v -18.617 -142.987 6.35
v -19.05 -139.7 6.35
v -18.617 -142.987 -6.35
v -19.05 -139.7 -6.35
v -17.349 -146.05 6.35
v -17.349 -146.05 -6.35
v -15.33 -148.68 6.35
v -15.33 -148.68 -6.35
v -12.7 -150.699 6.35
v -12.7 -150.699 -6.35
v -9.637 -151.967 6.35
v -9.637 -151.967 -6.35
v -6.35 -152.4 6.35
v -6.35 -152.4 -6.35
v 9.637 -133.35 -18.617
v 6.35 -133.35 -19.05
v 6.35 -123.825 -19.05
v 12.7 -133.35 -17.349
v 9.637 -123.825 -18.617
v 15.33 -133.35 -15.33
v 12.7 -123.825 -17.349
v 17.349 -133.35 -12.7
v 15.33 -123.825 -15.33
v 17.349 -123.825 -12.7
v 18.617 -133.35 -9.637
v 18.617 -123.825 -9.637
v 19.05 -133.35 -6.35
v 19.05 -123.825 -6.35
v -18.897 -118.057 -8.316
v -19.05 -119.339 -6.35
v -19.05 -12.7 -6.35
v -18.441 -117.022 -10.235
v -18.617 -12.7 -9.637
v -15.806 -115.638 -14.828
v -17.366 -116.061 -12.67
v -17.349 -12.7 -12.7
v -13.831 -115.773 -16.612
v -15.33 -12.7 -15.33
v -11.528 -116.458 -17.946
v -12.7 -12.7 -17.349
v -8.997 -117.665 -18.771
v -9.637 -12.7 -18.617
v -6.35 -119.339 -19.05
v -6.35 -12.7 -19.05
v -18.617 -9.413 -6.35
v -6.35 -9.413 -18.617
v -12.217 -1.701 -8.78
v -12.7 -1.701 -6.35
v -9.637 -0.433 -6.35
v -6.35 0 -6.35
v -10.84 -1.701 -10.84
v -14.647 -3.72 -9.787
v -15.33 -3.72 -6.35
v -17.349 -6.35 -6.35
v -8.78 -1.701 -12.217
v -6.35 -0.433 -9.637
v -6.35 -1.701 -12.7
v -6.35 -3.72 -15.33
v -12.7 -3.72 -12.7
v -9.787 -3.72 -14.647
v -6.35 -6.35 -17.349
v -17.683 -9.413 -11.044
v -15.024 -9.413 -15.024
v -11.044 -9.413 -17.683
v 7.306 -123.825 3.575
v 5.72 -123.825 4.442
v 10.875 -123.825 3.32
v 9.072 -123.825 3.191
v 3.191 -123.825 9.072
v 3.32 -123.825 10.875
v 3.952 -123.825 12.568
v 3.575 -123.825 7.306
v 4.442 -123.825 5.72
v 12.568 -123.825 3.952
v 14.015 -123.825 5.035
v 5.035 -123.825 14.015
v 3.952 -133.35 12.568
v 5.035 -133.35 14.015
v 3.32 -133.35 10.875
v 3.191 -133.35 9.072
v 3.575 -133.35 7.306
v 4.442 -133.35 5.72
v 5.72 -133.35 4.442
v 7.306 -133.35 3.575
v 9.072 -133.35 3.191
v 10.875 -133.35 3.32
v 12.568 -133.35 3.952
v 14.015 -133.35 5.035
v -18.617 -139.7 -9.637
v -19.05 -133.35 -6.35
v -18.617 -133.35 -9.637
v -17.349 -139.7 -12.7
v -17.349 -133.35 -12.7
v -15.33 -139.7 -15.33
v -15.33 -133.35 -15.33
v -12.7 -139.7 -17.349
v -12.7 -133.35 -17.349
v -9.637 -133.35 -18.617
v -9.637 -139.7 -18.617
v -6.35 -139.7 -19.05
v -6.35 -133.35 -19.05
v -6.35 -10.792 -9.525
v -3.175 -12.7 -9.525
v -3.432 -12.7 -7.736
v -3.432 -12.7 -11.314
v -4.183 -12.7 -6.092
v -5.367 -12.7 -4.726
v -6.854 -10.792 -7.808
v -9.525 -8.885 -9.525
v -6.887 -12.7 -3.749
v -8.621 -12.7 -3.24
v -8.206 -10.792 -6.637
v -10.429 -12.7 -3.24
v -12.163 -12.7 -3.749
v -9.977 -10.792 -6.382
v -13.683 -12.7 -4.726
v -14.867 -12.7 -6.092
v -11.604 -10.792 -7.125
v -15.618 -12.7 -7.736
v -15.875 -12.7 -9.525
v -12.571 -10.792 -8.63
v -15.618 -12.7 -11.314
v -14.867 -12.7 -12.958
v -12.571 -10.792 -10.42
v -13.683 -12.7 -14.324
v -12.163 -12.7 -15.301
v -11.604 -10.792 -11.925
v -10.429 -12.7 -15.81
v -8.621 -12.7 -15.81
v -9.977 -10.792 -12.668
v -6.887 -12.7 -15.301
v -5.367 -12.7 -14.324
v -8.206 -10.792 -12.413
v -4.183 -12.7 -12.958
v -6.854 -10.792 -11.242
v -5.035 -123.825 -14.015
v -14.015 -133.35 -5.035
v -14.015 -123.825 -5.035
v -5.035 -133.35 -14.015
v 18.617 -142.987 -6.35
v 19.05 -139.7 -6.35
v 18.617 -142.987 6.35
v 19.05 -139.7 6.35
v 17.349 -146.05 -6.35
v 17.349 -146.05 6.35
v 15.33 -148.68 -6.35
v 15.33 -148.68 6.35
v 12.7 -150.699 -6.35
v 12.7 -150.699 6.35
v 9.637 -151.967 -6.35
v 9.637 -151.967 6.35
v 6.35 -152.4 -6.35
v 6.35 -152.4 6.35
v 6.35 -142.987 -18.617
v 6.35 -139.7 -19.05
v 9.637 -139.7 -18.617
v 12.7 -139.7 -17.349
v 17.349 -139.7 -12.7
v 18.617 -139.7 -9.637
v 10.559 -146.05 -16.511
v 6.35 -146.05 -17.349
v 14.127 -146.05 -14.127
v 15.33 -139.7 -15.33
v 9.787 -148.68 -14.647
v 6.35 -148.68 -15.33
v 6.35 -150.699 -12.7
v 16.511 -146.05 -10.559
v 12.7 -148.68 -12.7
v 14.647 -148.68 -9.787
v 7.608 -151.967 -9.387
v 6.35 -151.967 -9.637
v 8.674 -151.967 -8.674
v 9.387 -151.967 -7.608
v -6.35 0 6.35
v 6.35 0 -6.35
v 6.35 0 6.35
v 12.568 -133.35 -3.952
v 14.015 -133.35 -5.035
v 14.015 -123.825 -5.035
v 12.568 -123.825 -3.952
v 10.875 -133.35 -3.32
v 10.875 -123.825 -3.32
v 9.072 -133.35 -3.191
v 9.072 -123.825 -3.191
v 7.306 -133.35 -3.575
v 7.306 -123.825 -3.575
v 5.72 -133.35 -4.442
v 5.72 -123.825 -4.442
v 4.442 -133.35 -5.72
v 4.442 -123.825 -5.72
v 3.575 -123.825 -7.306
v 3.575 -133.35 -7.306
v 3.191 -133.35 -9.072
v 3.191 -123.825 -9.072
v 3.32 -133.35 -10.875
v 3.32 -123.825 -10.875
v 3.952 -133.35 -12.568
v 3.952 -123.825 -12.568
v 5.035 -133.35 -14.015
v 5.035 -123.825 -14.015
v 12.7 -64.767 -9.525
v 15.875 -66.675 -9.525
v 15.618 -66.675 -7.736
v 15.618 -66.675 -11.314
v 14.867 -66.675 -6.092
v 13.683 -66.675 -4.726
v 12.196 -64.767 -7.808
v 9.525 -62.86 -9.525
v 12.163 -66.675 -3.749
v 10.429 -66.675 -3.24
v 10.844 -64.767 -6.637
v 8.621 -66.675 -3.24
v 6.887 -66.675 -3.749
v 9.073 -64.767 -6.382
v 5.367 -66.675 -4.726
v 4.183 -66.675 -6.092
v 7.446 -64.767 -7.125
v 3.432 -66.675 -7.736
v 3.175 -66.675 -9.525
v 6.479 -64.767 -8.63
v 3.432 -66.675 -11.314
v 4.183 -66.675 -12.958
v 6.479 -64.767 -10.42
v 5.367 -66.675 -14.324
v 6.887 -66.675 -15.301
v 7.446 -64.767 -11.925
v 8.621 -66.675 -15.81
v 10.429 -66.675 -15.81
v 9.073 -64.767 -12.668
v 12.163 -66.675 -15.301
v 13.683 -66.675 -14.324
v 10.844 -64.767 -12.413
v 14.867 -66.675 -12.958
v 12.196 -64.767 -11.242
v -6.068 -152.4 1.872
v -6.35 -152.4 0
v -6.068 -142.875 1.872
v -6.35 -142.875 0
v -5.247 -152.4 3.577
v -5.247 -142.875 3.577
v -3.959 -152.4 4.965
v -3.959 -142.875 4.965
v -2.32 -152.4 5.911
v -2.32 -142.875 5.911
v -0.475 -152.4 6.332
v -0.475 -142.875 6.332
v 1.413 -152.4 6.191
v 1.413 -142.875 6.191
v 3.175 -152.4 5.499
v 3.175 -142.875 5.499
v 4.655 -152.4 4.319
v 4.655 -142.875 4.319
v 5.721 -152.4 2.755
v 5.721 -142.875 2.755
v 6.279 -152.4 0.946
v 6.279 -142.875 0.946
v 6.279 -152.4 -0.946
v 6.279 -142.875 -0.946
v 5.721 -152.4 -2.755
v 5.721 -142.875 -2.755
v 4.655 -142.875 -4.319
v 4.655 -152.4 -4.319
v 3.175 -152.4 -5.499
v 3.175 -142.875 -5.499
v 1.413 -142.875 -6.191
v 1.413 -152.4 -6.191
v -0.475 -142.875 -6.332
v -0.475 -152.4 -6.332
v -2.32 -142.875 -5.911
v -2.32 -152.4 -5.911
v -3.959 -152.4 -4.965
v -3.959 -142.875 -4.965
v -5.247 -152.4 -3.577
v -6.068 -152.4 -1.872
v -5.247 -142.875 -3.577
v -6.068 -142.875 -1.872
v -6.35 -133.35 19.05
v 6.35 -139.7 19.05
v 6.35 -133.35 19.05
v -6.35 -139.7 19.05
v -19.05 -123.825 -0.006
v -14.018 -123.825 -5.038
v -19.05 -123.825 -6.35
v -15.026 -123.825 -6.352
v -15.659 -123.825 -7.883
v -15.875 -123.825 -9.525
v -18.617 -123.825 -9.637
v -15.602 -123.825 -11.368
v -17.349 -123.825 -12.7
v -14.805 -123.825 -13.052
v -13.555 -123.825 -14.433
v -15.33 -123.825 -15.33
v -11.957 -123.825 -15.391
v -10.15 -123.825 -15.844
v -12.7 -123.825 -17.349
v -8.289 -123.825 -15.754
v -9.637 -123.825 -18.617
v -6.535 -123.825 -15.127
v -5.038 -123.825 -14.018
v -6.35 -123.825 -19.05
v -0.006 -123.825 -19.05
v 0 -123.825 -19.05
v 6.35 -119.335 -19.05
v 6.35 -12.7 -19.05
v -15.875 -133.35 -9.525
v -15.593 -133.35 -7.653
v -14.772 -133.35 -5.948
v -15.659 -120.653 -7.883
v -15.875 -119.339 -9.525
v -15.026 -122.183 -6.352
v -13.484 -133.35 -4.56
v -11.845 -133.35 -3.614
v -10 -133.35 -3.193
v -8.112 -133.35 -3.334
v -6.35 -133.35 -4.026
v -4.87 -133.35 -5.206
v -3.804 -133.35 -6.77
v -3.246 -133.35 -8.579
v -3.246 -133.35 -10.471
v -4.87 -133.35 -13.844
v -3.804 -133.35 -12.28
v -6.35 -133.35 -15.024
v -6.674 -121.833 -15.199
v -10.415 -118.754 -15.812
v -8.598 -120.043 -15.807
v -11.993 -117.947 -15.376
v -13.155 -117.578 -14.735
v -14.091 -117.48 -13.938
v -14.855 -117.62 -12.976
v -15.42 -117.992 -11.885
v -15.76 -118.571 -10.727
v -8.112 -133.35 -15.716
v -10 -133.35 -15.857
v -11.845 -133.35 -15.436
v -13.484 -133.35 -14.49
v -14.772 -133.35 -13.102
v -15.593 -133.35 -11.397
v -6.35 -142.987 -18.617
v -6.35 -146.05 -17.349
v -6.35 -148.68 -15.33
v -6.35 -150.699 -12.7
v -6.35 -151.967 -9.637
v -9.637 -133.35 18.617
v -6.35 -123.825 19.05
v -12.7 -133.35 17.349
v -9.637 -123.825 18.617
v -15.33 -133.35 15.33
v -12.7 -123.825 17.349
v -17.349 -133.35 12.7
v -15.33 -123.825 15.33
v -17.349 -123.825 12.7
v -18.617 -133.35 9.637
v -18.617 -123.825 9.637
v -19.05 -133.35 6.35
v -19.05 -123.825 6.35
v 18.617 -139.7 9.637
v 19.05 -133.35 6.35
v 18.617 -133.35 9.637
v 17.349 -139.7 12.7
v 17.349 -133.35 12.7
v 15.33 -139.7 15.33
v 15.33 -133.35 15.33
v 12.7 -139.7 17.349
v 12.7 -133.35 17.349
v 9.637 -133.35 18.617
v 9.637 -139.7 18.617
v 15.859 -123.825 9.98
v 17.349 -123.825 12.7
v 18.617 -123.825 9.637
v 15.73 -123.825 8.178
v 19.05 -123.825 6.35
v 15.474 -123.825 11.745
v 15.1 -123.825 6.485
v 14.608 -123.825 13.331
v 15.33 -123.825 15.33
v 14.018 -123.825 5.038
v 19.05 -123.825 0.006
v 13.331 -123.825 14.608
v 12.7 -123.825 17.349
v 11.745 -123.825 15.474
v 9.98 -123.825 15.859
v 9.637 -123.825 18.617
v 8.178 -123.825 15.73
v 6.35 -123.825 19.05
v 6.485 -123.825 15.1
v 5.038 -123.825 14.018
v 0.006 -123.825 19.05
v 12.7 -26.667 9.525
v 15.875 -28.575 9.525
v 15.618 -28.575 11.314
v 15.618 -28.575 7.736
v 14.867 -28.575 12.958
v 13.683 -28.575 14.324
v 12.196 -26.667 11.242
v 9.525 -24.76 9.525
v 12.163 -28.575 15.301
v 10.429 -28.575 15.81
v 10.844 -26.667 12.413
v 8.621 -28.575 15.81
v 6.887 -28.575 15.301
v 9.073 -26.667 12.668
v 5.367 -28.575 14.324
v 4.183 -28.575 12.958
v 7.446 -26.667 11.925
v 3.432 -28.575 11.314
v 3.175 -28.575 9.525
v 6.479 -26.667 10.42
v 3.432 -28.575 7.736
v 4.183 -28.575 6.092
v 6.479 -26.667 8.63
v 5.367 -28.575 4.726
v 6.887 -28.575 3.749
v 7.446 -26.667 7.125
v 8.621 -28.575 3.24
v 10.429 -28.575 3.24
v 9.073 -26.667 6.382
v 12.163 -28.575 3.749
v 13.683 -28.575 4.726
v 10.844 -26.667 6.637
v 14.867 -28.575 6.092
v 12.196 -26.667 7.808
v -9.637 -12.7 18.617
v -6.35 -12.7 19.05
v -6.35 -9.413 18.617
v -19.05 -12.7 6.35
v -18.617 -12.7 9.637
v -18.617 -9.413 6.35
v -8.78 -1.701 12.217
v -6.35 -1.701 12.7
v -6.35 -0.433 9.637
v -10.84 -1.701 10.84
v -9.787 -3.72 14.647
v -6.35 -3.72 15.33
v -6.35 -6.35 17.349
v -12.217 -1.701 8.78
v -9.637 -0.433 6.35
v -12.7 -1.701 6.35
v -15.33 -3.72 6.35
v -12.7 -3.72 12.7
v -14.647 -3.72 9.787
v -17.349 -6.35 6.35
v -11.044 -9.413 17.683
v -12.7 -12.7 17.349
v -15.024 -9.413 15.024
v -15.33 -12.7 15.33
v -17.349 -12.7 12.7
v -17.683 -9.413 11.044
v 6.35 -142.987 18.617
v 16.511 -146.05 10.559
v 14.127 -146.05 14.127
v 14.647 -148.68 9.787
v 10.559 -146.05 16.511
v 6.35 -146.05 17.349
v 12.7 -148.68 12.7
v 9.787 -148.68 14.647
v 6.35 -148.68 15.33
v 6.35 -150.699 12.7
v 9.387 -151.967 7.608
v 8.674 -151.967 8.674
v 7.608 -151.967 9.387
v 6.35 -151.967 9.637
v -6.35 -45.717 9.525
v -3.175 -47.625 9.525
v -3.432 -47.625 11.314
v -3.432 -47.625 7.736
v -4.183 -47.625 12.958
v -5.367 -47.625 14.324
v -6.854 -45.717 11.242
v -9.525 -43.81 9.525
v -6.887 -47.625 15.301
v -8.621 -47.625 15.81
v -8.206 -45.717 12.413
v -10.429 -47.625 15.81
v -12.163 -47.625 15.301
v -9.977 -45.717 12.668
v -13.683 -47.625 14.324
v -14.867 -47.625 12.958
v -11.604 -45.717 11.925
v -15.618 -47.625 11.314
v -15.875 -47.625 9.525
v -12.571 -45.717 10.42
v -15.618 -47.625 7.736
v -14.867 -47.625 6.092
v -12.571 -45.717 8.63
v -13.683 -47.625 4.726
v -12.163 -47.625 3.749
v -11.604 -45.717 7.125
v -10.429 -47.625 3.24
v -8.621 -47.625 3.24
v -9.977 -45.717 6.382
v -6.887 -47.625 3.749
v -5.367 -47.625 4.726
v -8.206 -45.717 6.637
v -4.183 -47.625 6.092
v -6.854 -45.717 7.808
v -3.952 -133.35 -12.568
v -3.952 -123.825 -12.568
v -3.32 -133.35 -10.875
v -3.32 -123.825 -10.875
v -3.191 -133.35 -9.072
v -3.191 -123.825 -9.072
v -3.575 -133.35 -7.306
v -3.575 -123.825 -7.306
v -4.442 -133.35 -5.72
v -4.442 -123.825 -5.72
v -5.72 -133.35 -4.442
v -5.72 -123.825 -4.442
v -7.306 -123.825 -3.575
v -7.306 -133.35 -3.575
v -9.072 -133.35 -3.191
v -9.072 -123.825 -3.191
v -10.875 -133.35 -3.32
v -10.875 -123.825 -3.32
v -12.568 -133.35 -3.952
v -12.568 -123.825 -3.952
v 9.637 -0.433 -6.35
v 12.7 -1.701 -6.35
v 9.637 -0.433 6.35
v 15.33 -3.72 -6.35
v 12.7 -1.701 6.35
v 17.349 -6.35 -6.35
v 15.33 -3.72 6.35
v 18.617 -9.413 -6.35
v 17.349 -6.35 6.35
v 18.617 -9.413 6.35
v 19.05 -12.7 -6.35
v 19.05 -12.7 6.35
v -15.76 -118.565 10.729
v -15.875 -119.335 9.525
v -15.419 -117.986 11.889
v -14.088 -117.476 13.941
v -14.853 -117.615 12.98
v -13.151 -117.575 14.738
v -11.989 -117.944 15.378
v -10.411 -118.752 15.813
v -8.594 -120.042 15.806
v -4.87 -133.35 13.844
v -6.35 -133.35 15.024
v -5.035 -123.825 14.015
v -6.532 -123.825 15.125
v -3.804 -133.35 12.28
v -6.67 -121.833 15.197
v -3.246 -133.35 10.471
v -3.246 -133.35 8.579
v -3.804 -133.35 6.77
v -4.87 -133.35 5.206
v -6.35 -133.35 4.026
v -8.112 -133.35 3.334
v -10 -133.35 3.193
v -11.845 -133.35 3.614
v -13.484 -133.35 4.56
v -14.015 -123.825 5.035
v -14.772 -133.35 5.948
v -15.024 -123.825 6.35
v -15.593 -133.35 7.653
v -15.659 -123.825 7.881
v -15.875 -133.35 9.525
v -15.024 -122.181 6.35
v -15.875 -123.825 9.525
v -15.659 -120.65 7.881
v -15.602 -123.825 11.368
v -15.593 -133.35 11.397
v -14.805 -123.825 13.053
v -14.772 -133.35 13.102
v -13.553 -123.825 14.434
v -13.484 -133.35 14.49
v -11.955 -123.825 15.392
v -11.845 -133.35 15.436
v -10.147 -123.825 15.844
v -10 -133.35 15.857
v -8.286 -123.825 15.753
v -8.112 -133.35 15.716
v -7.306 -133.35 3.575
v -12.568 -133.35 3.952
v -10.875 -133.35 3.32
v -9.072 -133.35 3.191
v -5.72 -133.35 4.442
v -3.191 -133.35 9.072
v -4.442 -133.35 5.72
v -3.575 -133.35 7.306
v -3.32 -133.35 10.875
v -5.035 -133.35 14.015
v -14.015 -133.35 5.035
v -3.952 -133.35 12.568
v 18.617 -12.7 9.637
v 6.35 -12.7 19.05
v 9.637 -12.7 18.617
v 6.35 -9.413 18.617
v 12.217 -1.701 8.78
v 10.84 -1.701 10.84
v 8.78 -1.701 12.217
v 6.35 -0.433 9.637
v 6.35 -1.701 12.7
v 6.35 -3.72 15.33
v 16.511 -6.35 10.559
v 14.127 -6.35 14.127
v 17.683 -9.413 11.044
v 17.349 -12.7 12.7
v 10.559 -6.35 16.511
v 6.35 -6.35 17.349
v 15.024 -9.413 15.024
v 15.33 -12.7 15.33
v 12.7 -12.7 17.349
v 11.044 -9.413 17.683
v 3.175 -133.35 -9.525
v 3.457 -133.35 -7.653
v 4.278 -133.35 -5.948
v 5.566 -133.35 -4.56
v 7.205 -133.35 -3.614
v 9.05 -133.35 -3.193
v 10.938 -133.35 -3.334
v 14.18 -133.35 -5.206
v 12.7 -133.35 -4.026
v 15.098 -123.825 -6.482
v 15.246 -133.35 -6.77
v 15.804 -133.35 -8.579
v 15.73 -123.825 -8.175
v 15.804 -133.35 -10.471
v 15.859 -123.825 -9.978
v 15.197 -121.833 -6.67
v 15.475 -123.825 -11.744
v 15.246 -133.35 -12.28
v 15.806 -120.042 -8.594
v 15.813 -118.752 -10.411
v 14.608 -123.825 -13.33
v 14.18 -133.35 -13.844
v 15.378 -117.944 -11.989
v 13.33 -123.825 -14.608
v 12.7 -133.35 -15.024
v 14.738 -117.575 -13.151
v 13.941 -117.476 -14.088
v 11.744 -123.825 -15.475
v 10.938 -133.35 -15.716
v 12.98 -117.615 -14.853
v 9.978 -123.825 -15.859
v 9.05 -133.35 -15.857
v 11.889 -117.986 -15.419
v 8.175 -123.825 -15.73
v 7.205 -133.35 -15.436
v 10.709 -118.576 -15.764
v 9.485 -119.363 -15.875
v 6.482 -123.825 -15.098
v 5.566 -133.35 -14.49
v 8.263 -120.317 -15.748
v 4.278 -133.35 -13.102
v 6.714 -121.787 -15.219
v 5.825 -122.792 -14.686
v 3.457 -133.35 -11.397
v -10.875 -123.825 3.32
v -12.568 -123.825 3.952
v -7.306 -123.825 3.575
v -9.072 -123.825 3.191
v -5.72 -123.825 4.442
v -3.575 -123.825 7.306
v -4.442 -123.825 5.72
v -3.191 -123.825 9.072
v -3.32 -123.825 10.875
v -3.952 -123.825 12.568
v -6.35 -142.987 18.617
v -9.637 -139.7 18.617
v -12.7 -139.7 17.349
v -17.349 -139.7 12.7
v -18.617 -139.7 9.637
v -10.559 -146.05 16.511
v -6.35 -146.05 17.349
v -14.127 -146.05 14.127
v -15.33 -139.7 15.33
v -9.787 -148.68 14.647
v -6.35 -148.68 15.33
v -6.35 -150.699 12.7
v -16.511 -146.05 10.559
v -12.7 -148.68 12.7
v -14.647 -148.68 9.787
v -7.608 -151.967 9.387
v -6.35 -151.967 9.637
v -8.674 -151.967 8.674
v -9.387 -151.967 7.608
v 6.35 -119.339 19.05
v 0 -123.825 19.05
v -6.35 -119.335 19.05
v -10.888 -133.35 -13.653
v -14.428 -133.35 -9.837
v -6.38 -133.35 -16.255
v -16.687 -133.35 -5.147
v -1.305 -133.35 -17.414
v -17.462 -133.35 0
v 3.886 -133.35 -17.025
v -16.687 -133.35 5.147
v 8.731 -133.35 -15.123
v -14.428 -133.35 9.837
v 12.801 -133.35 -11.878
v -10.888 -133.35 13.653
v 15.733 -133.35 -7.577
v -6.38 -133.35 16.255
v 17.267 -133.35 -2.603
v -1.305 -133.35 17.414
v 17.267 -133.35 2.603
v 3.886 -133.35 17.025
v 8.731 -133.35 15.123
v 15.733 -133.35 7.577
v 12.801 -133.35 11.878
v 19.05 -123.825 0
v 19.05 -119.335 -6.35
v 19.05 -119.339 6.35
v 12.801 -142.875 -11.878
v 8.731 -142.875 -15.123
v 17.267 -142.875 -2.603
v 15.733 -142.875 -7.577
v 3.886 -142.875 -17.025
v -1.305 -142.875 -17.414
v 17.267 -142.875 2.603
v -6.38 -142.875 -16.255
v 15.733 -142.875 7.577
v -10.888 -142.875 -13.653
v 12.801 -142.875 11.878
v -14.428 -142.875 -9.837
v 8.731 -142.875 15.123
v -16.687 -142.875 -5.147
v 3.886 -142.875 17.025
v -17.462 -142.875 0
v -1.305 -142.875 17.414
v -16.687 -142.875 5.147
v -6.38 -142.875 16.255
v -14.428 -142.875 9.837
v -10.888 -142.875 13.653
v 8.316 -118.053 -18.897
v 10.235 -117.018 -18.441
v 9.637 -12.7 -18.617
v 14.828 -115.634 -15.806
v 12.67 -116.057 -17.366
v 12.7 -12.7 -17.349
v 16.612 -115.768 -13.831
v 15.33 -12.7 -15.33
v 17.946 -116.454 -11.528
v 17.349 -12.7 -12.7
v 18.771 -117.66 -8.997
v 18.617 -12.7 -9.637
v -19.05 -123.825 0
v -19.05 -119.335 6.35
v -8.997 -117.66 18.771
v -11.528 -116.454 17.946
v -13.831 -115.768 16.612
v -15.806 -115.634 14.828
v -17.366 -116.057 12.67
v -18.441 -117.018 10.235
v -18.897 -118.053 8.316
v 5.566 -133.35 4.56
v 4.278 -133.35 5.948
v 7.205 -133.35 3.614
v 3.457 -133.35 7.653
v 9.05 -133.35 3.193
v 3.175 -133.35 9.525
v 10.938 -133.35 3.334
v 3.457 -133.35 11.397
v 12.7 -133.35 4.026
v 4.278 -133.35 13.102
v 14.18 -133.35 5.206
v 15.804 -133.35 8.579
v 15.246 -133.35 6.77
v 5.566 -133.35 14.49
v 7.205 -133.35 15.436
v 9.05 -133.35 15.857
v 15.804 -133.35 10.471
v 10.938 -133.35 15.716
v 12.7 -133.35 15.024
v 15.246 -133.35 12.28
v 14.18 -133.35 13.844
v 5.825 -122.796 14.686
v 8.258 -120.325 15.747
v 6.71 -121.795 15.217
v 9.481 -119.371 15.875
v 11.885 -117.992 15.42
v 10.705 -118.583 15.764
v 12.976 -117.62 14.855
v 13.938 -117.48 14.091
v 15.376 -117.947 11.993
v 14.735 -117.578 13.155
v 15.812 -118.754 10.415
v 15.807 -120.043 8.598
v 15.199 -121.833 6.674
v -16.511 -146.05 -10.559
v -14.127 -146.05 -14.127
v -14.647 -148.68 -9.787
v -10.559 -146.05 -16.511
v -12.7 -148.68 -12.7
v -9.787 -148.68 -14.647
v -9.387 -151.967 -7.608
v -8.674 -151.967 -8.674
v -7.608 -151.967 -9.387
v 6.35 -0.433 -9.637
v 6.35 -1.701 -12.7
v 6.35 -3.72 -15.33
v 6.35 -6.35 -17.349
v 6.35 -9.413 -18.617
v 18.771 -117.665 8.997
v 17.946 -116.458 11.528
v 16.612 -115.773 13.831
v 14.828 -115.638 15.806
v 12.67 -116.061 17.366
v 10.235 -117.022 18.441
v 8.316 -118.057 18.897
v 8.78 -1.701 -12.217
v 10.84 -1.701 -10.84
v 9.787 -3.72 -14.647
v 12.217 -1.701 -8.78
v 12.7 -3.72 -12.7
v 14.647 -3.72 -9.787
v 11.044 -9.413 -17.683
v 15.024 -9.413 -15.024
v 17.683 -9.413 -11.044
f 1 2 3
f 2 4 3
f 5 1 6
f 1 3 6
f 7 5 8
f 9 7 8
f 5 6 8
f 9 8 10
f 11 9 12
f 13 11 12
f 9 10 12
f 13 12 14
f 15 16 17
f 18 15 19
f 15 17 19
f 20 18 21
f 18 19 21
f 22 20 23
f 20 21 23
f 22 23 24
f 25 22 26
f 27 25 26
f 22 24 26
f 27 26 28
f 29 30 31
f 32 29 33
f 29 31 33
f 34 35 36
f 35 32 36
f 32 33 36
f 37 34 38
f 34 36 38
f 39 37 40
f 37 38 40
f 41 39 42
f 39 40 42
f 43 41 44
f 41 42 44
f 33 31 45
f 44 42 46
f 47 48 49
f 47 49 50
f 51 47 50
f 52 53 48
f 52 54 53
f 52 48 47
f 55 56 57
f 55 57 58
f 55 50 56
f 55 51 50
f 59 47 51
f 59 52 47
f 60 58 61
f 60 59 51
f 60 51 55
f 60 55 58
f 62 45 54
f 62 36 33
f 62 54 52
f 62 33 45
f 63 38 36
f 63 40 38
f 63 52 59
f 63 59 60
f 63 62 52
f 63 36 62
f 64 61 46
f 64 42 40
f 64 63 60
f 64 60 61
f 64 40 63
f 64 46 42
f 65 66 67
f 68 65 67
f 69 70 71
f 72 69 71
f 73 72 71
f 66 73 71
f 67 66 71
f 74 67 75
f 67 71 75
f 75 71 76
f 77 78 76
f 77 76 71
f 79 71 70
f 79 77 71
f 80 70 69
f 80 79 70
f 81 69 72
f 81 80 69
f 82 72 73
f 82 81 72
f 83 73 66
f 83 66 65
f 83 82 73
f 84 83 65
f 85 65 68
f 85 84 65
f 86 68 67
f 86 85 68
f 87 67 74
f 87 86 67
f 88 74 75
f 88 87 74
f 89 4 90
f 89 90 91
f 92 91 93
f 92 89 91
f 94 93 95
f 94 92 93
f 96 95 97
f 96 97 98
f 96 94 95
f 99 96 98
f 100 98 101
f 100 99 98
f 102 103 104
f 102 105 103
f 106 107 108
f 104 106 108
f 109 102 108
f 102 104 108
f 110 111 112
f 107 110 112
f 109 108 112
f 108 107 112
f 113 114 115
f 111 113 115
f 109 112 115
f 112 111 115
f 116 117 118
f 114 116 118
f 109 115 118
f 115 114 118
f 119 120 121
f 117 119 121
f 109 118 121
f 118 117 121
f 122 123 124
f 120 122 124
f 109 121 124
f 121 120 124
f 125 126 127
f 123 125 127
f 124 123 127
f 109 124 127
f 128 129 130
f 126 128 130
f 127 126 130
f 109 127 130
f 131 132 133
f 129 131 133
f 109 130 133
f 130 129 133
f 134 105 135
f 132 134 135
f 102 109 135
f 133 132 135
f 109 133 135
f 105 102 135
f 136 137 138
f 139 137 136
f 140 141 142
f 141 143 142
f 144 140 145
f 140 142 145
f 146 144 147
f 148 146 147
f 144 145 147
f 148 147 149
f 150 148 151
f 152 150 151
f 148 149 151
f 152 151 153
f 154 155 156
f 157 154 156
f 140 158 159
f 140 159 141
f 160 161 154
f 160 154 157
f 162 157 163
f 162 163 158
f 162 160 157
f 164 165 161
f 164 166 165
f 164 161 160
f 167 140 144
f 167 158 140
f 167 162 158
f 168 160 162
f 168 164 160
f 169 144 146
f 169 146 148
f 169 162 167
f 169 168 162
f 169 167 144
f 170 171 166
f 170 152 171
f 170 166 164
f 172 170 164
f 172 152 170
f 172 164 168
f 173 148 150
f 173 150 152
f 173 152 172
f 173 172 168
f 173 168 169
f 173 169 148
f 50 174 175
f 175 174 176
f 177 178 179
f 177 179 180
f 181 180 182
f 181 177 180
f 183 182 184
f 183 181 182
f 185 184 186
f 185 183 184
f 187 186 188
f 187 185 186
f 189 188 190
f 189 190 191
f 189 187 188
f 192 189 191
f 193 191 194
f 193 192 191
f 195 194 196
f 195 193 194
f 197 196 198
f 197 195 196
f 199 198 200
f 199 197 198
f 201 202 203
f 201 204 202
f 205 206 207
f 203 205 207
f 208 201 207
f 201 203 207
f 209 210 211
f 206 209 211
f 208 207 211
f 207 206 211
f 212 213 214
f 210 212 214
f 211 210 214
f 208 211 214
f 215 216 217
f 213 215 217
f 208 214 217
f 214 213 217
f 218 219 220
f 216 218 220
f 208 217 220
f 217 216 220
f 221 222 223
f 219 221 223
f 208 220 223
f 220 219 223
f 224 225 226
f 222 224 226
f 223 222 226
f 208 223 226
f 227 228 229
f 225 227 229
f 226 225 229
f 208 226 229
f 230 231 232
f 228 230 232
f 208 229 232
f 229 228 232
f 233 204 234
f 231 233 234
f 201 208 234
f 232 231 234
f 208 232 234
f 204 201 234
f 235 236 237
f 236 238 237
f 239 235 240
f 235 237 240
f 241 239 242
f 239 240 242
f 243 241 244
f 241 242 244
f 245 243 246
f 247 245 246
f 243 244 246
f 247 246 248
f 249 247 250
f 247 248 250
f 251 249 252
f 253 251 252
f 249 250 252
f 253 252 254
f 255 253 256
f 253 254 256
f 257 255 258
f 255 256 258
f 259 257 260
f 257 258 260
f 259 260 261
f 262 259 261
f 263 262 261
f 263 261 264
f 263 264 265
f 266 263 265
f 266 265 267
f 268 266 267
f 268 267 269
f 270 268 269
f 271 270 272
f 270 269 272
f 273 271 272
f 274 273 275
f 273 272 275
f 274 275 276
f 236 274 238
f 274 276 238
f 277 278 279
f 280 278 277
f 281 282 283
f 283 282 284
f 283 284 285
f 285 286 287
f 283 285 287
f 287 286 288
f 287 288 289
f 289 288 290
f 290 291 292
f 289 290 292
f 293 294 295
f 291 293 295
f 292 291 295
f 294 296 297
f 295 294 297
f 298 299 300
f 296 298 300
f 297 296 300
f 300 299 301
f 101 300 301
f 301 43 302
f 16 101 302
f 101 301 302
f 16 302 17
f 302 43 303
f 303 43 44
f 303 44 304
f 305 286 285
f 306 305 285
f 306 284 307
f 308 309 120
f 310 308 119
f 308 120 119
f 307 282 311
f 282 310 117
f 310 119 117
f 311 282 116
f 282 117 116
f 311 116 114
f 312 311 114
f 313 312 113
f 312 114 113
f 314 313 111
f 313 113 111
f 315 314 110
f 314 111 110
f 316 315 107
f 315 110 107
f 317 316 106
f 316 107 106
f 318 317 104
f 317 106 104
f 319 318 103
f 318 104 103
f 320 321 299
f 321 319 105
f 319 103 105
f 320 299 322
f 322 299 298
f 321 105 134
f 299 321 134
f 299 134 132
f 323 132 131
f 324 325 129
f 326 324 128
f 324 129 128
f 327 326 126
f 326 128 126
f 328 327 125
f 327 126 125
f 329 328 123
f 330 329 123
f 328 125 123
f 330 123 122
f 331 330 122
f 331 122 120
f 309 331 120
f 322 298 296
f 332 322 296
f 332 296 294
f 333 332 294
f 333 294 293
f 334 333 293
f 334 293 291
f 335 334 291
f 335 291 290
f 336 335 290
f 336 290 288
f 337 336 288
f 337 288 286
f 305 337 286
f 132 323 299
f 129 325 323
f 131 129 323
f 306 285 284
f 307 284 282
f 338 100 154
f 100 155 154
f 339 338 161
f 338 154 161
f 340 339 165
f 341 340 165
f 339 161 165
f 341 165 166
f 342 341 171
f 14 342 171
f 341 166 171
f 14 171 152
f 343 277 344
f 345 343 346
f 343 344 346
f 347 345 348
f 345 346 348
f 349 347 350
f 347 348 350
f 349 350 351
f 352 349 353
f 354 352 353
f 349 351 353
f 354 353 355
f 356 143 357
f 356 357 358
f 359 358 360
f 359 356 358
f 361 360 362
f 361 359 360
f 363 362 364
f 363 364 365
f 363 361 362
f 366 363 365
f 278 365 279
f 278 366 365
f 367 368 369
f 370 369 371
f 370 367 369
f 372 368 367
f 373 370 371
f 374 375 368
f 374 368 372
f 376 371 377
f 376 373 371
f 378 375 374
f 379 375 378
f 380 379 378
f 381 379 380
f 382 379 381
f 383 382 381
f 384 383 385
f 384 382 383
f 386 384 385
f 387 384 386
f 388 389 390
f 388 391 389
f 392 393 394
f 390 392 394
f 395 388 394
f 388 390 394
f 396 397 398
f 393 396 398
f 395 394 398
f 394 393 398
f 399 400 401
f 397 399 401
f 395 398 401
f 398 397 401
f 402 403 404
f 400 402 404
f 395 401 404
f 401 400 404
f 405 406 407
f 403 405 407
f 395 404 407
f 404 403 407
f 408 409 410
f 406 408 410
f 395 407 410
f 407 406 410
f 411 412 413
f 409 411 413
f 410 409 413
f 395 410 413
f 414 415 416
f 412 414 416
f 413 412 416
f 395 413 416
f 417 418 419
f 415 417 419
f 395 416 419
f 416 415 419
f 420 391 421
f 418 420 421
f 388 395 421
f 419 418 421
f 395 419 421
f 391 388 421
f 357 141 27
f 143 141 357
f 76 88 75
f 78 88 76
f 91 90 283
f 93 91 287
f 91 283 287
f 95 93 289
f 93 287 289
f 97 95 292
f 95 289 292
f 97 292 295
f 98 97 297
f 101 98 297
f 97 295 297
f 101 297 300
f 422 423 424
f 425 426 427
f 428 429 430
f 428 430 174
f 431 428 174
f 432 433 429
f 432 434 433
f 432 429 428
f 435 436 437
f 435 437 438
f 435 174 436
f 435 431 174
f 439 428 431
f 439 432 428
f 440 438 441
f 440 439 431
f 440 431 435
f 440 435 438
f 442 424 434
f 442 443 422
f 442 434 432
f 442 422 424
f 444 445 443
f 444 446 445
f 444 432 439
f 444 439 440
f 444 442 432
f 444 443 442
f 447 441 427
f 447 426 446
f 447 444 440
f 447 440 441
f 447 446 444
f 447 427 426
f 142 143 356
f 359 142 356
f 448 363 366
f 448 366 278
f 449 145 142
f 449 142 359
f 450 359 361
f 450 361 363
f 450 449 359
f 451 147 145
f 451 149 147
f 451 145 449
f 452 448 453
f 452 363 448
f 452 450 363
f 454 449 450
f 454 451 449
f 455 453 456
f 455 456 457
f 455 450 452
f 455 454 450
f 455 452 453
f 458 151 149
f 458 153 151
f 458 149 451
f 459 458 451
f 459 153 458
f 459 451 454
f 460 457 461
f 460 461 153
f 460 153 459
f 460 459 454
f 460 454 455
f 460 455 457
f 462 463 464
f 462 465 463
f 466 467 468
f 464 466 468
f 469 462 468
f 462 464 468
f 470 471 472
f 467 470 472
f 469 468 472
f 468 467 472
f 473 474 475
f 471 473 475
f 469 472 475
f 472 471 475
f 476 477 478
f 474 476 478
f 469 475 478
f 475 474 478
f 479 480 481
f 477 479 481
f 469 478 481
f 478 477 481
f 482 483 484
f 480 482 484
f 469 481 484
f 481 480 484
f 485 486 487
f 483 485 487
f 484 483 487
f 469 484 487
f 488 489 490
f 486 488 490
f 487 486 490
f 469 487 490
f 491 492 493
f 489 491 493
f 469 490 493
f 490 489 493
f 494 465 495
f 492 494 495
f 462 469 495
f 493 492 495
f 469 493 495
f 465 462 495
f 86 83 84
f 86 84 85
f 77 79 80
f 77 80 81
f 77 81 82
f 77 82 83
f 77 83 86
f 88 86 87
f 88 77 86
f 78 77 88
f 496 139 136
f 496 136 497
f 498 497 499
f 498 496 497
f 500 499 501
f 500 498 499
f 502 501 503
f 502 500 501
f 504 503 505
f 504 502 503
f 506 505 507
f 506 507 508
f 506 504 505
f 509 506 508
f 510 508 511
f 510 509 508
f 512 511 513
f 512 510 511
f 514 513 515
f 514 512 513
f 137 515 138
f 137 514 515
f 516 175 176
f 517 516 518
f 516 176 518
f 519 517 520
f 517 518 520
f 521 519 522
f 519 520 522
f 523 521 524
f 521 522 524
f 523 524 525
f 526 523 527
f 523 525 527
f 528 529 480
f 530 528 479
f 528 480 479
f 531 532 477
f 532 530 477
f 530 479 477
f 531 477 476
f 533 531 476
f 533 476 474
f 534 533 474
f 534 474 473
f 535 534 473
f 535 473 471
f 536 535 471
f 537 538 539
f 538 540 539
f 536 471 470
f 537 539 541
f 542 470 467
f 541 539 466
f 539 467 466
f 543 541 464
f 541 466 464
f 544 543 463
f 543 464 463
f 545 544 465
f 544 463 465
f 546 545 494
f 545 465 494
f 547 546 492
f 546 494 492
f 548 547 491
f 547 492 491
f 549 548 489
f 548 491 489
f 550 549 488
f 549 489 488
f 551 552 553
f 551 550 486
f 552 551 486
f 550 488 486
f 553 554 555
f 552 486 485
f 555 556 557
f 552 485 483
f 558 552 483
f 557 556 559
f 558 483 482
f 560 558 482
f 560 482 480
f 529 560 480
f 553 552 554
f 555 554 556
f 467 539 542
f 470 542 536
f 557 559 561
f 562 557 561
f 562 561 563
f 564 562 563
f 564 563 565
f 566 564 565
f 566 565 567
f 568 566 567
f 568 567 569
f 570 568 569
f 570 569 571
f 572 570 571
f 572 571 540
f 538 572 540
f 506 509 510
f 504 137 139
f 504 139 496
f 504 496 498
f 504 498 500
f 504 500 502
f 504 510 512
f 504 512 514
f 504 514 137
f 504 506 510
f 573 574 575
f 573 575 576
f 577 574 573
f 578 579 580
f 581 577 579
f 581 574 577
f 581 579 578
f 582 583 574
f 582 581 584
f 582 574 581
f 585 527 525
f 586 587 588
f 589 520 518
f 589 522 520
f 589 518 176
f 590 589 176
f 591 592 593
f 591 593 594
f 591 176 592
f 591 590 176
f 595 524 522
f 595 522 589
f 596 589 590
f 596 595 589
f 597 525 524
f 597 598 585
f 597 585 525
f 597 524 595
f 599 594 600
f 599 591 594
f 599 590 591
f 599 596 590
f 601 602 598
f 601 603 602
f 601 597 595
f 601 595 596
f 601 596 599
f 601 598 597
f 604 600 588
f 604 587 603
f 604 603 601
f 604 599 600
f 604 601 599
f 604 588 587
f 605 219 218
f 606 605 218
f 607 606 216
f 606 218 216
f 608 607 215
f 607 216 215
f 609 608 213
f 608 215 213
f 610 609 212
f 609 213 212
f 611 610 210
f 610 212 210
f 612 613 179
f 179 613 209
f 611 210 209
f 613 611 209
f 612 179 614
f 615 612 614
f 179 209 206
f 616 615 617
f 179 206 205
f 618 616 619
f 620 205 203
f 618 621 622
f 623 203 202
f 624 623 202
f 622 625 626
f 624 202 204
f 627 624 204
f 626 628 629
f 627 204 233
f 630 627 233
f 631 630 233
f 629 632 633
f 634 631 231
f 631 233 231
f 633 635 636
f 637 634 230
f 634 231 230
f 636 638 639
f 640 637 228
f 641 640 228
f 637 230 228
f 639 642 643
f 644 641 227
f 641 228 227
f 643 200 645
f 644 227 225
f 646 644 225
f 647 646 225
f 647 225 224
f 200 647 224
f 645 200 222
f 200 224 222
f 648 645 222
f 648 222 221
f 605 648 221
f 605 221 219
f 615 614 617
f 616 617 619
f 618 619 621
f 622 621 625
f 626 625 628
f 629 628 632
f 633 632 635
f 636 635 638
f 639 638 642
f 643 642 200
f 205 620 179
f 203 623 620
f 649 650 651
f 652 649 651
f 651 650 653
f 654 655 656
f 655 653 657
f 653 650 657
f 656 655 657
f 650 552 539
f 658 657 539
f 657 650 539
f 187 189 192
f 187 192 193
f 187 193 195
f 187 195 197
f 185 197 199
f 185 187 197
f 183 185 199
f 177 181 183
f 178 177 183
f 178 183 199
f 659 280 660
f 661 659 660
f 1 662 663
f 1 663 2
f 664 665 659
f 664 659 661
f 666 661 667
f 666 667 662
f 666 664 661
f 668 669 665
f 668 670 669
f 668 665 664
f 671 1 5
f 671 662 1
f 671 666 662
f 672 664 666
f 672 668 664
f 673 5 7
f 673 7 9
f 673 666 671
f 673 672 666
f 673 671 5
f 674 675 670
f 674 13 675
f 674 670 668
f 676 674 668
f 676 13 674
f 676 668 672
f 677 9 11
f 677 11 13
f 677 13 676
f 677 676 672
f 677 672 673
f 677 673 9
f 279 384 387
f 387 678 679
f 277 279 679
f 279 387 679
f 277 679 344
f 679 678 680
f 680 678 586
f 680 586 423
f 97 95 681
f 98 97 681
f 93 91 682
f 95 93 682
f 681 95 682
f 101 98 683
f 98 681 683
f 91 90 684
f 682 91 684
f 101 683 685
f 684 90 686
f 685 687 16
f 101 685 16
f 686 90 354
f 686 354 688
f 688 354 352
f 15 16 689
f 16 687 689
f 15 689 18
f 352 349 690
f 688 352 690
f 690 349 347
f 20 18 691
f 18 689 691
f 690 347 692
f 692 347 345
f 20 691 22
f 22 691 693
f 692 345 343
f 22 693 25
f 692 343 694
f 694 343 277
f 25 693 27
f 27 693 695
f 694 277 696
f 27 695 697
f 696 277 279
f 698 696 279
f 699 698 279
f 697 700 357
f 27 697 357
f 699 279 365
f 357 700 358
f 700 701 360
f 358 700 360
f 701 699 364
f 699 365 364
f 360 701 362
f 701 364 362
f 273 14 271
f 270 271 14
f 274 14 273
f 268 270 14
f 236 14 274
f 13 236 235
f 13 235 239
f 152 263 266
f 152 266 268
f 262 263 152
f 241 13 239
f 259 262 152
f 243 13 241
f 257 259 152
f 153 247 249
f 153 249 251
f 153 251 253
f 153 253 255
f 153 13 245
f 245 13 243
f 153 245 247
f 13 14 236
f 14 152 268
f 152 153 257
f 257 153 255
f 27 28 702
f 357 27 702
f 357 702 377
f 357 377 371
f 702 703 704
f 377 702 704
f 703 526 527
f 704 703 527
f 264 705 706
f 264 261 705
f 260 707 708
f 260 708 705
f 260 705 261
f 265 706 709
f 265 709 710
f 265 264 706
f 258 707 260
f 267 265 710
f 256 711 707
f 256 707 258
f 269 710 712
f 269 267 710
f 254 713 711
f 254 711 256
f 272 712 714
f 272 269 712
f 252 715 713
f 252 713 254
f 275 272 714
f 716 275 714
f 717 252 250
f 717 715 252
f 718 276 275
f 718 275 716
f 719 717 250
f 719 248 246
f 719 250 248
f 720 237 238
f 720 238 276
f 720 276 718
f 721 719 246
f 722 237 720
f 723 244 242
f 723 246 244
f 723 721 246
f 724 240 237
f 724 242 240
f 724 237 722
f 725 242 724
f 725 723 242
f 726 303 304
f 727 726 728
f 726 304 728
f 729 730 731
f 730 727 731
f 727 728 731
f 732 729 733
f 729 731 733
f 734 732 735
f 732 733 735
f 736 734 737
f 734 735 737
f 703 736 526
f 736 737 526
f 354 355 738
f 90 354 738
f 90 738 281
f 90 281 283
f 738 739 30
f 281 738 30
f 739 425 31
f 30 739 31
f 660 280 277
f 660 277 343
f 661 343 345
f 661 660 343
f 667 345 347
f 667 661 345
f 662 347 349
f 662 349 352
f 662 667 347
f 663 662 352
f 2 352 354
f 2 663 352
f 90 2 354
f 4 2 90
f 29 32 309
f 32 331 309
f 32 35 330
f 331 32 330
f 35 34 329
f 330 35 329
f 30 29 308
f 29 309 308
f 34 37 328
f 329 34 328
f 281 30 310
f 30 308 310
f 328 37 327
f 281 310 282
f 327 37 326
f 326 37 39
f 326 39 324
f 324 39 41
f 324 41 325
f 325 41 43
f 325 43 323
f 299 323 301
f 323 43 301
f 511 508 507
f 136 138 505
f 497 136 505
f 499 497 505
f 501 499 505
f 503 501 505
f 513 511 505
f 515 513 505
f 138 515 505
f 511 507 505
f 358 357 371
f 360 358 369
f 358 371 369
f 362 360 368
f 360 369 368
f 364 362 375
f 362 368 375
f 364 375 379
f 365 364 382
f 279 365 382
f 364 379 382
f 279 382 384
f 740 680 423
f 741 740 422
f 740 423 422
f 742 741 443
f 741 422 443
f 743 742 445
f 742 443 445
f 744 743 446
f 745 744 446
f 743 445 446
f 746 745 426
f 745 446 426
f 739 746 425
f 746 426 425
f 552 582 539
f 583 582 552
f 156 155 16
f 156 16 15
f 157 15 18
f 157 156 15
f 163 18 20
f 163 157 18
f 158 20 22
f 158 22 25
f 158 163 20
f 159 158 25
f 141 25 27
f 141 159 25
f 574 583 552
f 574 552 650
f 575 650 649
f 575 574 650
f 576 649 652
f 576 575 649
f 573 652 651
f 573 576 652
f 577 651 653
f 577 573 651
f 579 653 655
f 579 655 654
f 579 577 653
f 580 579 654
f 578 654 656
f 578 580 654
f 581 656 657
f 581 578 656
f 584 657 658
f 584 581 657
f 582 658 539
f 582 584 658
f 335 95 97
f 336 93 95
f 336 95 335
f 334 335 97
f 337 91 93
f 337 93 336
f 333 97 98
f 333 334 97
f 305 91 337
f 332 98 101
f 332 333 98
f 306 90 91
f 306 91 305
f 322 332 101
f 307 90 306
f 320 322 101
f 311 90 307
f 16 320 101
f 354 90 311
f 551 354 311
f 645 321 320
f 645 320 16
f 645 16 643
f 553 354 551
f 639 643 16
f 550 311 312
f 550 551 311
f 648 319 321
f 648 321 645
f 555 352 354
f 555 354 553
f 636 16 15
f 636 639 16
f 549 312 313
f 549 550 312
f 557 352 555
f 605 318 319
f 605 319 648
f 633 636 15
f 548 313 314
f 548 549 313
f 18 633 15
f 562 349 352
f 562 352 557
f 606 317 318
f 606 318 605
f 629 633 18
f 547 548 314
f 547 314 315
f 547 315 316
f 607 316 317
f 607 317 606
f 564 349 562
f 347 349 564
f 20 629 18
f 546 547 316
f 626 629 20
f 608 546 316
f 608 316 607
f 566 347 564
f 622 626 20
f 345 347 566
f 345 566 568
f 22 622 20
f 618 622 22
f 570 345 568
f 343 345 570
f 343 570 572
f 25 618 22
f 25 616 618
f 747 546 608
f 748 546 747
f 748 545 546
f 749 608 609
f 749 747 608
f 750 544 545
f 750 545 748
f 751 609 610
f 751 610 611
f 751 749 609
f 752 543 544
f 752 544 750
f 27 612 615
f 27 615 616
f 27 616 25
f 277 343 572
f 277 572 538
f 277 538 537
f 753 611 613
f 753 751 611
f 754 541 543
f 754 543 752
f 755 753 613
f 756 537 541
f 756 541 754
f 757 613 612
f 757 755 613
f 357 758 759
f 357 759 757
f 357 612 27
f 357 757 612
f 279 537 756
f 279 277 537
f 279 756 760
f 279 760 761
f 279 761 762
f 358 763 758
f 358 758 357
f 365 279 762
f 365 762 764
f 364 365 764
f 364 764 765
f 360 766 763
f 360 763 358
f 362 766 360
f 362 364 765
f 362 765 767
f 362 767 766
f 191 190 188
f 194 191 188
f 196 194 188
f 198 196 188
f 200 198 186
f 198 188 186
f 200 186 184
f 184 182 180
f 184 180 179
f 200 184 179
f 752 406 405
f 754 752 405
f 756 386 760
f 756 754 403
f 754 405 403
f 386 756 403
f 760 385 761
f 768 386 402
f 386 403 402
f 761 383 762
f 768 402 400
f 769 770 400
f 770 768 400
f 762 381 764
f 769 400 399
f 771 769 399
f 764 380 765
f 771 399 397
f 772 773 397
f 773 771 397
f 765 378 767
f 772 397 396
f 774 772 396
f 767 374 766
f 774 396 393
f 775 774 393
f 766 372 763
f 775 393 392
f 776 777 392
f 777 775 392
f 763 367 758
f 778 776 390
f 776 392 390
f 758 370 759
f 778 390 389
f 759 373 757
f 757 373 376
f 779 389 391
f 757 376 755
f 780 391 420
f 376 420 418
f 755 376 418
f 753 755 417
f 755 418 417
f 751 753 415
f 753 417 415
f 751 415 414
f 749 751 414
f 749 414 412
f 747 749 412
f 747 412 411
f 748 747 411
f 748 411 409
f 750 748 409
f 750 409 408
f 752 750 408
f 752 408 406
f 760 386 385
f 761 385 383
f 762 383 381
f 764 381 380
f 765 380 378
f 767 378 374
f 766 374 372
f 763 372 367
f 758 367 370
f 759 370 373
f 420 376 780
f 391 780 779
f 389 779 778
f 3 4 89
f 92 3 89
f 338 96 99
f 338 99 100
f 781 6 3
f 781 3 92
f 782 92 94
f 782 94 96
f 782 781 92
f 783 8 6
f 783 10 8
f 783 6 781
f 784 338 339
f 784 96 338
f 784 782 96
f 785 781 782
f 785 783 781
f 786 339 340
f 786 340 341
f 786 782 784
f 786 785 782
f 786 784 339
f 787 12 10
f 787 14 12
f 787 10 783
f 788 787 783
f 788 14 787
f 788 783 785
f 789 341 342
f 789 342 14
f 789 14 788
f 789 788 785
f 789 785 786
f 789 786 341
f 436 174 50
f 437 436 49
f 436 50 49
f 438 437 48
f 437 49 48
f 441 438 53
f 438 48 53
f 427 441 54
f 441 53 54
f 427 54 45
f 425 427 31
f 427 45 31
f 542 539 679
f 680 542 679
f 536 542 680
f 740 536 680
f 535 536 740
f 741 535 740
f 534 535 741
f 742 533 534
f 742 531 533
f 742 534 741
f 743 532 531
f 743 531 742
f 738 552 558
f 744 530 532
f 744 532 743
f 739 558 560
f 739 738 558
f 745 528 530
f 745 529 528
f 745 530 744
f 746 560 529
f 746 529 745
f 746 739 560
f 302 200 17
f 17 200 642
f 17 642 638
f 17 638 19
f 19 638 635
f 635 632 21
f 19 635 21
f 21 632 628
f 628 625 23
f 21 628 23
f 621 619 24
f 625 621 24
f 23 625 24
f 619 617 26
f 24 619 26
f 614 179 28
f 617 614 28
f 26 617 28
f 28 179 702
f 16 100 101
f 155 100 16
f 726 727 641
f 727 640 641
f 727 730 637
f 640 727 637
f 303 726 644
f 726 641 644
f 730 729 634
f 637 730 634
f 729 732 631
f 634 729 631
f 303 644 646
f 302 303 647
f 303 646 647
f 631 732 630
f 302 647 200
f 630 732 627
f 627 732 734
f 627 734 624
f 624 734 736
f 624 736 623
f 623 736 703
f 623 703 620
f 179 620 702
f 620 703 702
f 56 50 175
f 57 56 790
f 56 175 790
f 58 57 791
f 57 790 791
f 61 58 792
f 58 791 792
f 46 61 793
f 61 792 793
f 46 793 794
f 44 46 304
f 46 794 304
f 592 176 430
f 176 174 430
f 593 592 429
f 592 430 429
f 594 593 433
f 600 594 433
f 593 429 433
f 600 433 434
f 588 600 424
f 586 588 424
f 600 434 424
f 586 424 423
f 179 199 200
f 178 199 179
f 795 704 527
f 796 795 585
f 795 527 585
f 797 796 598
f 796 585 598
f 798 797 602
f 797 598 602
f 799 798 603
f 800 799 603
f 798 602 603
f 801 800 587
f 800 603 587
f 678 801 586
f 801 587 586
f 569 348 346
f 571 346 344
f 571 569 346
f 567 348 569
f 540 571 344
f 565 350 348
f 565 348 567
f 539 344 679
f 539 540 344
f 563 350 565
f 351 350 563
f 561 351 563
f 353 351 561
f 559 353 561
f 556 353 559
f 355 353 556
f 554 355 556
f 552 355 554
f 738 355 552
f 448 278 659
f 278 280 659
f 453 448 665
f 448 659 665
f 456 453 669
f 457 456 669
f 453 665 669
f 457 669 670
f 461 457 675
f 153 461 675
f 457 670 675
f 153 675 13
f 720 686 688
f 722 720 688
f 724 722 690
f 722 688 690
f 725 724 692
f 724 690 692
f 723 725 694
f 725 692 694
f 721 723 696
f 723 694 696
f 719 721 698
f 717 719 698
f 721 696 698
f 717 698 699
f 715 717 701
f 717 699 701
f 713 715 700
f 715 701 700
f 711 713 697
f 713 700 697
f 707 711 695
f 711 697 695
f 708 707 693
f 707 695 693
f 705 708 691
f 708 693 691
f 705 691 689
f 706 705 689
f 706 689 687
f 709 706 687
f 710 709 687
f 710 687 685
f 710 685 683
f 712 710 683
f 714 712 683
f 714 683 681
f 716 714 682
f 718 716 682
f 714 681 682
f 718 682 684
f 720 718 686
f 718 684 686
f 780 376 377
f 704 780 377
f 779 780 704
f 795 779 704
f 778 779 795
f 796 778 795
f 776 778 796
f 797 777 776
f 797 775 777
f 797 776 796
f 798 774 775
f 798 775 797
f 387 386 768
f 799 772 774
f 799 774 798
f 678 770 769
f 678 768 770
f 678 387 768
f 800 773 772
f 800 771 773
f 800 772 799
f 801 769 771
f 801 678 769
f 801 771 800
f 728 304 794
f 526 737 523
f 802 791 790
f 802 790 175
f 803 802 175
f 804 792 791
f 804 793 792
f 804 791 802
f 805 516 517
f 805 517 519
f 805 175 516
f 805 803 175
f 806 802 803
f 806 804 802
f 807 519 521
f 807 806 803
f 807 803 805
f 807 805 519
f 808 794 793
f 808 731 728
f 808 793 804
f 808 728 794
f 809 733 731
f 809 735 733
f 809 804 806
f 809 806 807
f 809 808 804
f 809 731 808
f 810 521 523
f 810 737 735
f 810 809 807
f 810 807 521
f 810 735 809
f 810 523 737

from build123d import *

# Parameters (mm, degrees)
F1_DEPTH  = 133.35
F3_D      = 12.7
F3_DEPTH  = 120.65
F3_TIP    = 3.8154649308
F4_D      = 12.7
F4_DEPTH  = 104.775
F4_TIP    = 3.8154649308
F5_D      = 12.7
F5_DEPTH  = 85.725
F5_TIP    = 3.8154649308
F6_D      = 12.7
F6_DEPTH  = 66.675
F6_TIP    = 3.8154649308
F11_DEPTH = 15.621
F14_DEPTH = 15.875
F17_DEPTH = 9.525
F20_DEPTH = 19.05
F21_R     = 17.4625
F22_DEPTH = 9.525
F24_D     = 12.7
F24_DEPTH = 9.525
F24_TIP   = 3.8154649308
F26_R     = 12.69999
F26_2_R   = 12.69999


# Not quite as in the source:
# - a fillet or chamfer is up to 0.001 mm smaller than in the source, because OpenCascade refuses the exact size
# - a feature of the source that left no trace in its solid (it failed there, or was rolled back) is left out


with BuildPart() as f1:
    # F0 (on Front) → F1 (new body)
    with BuildSketch(Plane.XZ):
        with BuildLine():
            ThreePointArc((19.05, 6.35), (15.3302561211, 15.3302561211), (6.35, 19.05))
            Line((6.35, 19.05), (-6.35, 19.05))
            ThreePointArc((-6.35, 19.05), (-15.3302561211, 15.3302561211), (-19.05, 6.35))
            Line((-19.05, 6.35), (-19.05, -6.35))
            ThreePointArc((-19.05, -6.35), (-15.3302561211, -15.3302561211), (-6.35, -19.05))
            Line((-6.35, -19.05), (6.35, -19.05))
            ThreePointArc((6.35, -19.05), (15.3302561211, -15.3302561211), (19.05, -6.35))
            Line((19.05, -6.35), (19.05, 6.35))
        make_face()
    extrude(amount=F1_DEPTH)

    # F3
    with Locations(Plane.XZ.offset(133.35)):
        with Locations((-9.525, -9.525)):
            Hole(F3_D / 2, depth=F3_DEPTH)
            with Locations((0, 0, -(F3_DEPTH + F3_TIP / 2))):  # 118° drill point
                Cone(0, F3_D / 2, F3_TIP, mode=Mode.SUBTRACT)

    # F4
    with Locations(Plane.XZ.offset(133.35)):
        with Locations((9.525, 9.525)):
            Hole(F4_D / 2, depth=F4_DEPTH)
            with Locations((0, 0, -(F4_DEPTH + F4_TIP / 2))):  # 118° drill point
                Cone(0, F4_D / 2, F4_TIP, mode=Mode.SUBTRACT)

    # F5
    with Locations(Plane.XZ.offset(133.35)):
        with Locations((-9.525, 9.525)):
            Hole(F5_D / 2, depth=F5_DEPTH)
            with Locations((0, 0, -(F5_DEPTH + F5_TIP / 2))):  # 118° drill point
                Cone(0, F5_D / 2, F5_TIP, mode=Mode.SUBTRACT)

    # F6
    with Locations(Plane.XZ.offset(133.35)):
        with Locations((9.525, -9.525)):
            Hole(F6_D / 2, depth=F6_DEPTH)
            with Locations((0, 0, -(F6_DEPTH + F6_TIP / 2))):  # 118° drill point
                Cone(0, F6_D / 2, F6_TIP, mode=Mode.SUBTRACT)

    # F10 (on line) → F11 (cut, symmetric)
    with BuildSketch(Plane(origin=(0, 0, 0), x_dir=(0, 1, 0), z_dir=(0.7071067812, 0, 0.7071067812))):
        Polygon((-123.825, 64.2703841816), (-123.825, 13.4703841816), (-73.025, 64.2703841816), align=None)
        Polygon((-123.825, -64.2703841816), (-73.025, -64.2703841816), (-123.825, -13.4703841816), align=None)
    extrude(amount=F11_DEPTH, both=True, mode=Mode.SUBTRACT)

    # F13 (on line) → F14 (cut, symmetric)
    with BuildSketch(Plane(origin=(0, 0, 0), x_dir=(0.7071067812, 0, 0.7071067812), z_dir=(0.7071067812, 0, -0.7071067812))):
        Polygon((38.8747, 123.825), (13.4747, 123.825), (38.8747, 98.425), align=None)
        Polygon((-38.8747, 123.825), (-38.8747, 98.425), (-13.4747, 123.825), align=None)
    extrude(amount=F14_DEPTH, both=True, mode=Mode.SUBTRACT)

    # F26 (radius 12.7 in the source; OpenCascade refuses exactly that, so slightly less here)
    f26_edges = [f1.edges().sort_by_distance(p)[0] for p in [
        (0, 0, 19.05),
        (19.05, 0, 0),
        (15.330256, 0, 15.330256),
        (-15.330256, 0, 15.330256),
        (-19.05, 0, 0),
        (-15.330256, 0, -15.330256),
        (0, 0, -19.05),
        (15.330256, 0, -15.330256),
    ]]
    fillet(f26_edges, radius=F26_R)


with BuildPart() as f17:
    # F16 (on offset) → F17 (new body)
    with BuildSketch(Plane.XZ.offset(133.35)):
        with BuildLine():
            Line((-5.0348719395, 14.0151280605), (-14.0151280605, 5.0348719395))
            ThreePointArc((-14.0151280605, 5.0348719395), (-5.0348719395, 5.0348719395), (-5.0348719395, 14.0151280605))
        make_face()
    extrude(amount=-F17_DEPTH)


with BuildPart() as f17b:
    # F16 (on offset) → F17, piece 2 (new body)
    with BuildSketch(Plane.XZ.offset(133.35)):
        with BuildLine():
            Line((14.0151280605, 5.0348719395), (5.0348719395, 14.0151280605))
            ThreePointArc((5.0348719395, 14.0151280605), (5.0348719395, 5.0348719395), (14.0151280605, 5.0348719395))
        make_face()
    extrude(amount=-F17_DEPTH)


with BuildPart() as f17c:
    # F16 (on offset) → F17, piece 3 (new body)
    with BuildSketch(Plane.XZ.offset(133.35)):
        with BuildLine():
            Line((5.0348719395, -14.0151280605), (14.0151280605, -5.0348719395))
            ThreePointArc((14.0151280605, -5.0348719395), (5.0348719395, -5.0348719395), (5.0348719395, -14.0151280605))
        make_face()
    extrude(amount=-F17_DEPTH)


with BuildPart() as f17d:
    # F16 (on offset) → F17, piece 4 (new body)
    with BuildSketch(Plane.XZ.offset(133.35)):
        with BuildLine():
            Line((-14.0151280605, -5.0348719395), (-5.0348719395, -14.0151280605))
            ThreePointArc((-5.0348719395, -14.0151280605), (-5.0348719395, -5.0348719395), (-14.0151280605, -5.0348719395))
        make_face()
    extrude(amount=-F17_DEPTH)


with BuildPart() as f20:
    # F19 (on offset) → F20 (new body)
    with BuildSketch(Plane.XZ.offset(152.4)):
        with BuildLine():
            Line((-6.35, -19.05), (6.35, -19.05))
            ThreePointArc((6.35, -19.05), (15.3302561211, -15.3302561211), (19.05, -6.35))
            Line((19.05, -6.35), (19.05, 6.35))
            ThreePointArc((19.05, 6.35), (15.3302561211, 15.3302561211), (6.35, 19.05))
            Line((6.35, 19.05), (-6.35, 19.05))
            ThreePointArc((-6.35, 19.05), (-15.3302561211, 15.3302561211), (-19.05, 6.35))
            Line((-19.05, 6.35), (-19.05, -6.35))
            ThreePointArc((-19.05, -6.35), (-15.3302561211, -15.3302561211), (-6.35, -19.05))
        make_face()
    extrude(amount=-F20_DEPTH)

    # F21 (on face) → F22 (cut)
    with BuildSketch(Plane(origin=(0, -133.35, 0), x_dir=(-1, 0, 0), z_dir=(0, 1, 0))):
        Circle(F21_R)
    extrude(amount=-F22_DEPTH, mode=Mode.SUBTRACT)

    # F24
    with Locations(Plane.XZ.offset(152.4)):
        with Locations((0, 0)):
            Hole(F24_D / 2, depth=F24_DEPTH)
            with Locations((0, 0, -(F24_DEPTH + F24_TIP / 2))):  # 118° drill point
                Cone(0, F24_D / 2, F24_TIP, mode=Mode.SUBTRACT)

    # F26#2 (radius 12.7 in the source; OpenCascade refuses exactly that, so slightly less here)
    f26_2_edges = [f20.edges().sort_by_distance(p)[0] for p in [
        (0, -152.4, 19.05),
        (-19.05, -152.4, 0),
        (-15.330256, -152.4, 15.330256),
        (-15.330256, -152.4, -15.330256),
        (0, -152.4, -19.05),
        (15.330256, -152.4, 15.330256),
        (15.330256, -152.4, -15.330256),
        (19.05, -152.4, 0),
    ]]
    fillet(f26_2_edges, radius=F26_2_R)


solid = Compound([f1.part, f17.part, f17b.part, f17c.part, f17d.part, f20.part])
